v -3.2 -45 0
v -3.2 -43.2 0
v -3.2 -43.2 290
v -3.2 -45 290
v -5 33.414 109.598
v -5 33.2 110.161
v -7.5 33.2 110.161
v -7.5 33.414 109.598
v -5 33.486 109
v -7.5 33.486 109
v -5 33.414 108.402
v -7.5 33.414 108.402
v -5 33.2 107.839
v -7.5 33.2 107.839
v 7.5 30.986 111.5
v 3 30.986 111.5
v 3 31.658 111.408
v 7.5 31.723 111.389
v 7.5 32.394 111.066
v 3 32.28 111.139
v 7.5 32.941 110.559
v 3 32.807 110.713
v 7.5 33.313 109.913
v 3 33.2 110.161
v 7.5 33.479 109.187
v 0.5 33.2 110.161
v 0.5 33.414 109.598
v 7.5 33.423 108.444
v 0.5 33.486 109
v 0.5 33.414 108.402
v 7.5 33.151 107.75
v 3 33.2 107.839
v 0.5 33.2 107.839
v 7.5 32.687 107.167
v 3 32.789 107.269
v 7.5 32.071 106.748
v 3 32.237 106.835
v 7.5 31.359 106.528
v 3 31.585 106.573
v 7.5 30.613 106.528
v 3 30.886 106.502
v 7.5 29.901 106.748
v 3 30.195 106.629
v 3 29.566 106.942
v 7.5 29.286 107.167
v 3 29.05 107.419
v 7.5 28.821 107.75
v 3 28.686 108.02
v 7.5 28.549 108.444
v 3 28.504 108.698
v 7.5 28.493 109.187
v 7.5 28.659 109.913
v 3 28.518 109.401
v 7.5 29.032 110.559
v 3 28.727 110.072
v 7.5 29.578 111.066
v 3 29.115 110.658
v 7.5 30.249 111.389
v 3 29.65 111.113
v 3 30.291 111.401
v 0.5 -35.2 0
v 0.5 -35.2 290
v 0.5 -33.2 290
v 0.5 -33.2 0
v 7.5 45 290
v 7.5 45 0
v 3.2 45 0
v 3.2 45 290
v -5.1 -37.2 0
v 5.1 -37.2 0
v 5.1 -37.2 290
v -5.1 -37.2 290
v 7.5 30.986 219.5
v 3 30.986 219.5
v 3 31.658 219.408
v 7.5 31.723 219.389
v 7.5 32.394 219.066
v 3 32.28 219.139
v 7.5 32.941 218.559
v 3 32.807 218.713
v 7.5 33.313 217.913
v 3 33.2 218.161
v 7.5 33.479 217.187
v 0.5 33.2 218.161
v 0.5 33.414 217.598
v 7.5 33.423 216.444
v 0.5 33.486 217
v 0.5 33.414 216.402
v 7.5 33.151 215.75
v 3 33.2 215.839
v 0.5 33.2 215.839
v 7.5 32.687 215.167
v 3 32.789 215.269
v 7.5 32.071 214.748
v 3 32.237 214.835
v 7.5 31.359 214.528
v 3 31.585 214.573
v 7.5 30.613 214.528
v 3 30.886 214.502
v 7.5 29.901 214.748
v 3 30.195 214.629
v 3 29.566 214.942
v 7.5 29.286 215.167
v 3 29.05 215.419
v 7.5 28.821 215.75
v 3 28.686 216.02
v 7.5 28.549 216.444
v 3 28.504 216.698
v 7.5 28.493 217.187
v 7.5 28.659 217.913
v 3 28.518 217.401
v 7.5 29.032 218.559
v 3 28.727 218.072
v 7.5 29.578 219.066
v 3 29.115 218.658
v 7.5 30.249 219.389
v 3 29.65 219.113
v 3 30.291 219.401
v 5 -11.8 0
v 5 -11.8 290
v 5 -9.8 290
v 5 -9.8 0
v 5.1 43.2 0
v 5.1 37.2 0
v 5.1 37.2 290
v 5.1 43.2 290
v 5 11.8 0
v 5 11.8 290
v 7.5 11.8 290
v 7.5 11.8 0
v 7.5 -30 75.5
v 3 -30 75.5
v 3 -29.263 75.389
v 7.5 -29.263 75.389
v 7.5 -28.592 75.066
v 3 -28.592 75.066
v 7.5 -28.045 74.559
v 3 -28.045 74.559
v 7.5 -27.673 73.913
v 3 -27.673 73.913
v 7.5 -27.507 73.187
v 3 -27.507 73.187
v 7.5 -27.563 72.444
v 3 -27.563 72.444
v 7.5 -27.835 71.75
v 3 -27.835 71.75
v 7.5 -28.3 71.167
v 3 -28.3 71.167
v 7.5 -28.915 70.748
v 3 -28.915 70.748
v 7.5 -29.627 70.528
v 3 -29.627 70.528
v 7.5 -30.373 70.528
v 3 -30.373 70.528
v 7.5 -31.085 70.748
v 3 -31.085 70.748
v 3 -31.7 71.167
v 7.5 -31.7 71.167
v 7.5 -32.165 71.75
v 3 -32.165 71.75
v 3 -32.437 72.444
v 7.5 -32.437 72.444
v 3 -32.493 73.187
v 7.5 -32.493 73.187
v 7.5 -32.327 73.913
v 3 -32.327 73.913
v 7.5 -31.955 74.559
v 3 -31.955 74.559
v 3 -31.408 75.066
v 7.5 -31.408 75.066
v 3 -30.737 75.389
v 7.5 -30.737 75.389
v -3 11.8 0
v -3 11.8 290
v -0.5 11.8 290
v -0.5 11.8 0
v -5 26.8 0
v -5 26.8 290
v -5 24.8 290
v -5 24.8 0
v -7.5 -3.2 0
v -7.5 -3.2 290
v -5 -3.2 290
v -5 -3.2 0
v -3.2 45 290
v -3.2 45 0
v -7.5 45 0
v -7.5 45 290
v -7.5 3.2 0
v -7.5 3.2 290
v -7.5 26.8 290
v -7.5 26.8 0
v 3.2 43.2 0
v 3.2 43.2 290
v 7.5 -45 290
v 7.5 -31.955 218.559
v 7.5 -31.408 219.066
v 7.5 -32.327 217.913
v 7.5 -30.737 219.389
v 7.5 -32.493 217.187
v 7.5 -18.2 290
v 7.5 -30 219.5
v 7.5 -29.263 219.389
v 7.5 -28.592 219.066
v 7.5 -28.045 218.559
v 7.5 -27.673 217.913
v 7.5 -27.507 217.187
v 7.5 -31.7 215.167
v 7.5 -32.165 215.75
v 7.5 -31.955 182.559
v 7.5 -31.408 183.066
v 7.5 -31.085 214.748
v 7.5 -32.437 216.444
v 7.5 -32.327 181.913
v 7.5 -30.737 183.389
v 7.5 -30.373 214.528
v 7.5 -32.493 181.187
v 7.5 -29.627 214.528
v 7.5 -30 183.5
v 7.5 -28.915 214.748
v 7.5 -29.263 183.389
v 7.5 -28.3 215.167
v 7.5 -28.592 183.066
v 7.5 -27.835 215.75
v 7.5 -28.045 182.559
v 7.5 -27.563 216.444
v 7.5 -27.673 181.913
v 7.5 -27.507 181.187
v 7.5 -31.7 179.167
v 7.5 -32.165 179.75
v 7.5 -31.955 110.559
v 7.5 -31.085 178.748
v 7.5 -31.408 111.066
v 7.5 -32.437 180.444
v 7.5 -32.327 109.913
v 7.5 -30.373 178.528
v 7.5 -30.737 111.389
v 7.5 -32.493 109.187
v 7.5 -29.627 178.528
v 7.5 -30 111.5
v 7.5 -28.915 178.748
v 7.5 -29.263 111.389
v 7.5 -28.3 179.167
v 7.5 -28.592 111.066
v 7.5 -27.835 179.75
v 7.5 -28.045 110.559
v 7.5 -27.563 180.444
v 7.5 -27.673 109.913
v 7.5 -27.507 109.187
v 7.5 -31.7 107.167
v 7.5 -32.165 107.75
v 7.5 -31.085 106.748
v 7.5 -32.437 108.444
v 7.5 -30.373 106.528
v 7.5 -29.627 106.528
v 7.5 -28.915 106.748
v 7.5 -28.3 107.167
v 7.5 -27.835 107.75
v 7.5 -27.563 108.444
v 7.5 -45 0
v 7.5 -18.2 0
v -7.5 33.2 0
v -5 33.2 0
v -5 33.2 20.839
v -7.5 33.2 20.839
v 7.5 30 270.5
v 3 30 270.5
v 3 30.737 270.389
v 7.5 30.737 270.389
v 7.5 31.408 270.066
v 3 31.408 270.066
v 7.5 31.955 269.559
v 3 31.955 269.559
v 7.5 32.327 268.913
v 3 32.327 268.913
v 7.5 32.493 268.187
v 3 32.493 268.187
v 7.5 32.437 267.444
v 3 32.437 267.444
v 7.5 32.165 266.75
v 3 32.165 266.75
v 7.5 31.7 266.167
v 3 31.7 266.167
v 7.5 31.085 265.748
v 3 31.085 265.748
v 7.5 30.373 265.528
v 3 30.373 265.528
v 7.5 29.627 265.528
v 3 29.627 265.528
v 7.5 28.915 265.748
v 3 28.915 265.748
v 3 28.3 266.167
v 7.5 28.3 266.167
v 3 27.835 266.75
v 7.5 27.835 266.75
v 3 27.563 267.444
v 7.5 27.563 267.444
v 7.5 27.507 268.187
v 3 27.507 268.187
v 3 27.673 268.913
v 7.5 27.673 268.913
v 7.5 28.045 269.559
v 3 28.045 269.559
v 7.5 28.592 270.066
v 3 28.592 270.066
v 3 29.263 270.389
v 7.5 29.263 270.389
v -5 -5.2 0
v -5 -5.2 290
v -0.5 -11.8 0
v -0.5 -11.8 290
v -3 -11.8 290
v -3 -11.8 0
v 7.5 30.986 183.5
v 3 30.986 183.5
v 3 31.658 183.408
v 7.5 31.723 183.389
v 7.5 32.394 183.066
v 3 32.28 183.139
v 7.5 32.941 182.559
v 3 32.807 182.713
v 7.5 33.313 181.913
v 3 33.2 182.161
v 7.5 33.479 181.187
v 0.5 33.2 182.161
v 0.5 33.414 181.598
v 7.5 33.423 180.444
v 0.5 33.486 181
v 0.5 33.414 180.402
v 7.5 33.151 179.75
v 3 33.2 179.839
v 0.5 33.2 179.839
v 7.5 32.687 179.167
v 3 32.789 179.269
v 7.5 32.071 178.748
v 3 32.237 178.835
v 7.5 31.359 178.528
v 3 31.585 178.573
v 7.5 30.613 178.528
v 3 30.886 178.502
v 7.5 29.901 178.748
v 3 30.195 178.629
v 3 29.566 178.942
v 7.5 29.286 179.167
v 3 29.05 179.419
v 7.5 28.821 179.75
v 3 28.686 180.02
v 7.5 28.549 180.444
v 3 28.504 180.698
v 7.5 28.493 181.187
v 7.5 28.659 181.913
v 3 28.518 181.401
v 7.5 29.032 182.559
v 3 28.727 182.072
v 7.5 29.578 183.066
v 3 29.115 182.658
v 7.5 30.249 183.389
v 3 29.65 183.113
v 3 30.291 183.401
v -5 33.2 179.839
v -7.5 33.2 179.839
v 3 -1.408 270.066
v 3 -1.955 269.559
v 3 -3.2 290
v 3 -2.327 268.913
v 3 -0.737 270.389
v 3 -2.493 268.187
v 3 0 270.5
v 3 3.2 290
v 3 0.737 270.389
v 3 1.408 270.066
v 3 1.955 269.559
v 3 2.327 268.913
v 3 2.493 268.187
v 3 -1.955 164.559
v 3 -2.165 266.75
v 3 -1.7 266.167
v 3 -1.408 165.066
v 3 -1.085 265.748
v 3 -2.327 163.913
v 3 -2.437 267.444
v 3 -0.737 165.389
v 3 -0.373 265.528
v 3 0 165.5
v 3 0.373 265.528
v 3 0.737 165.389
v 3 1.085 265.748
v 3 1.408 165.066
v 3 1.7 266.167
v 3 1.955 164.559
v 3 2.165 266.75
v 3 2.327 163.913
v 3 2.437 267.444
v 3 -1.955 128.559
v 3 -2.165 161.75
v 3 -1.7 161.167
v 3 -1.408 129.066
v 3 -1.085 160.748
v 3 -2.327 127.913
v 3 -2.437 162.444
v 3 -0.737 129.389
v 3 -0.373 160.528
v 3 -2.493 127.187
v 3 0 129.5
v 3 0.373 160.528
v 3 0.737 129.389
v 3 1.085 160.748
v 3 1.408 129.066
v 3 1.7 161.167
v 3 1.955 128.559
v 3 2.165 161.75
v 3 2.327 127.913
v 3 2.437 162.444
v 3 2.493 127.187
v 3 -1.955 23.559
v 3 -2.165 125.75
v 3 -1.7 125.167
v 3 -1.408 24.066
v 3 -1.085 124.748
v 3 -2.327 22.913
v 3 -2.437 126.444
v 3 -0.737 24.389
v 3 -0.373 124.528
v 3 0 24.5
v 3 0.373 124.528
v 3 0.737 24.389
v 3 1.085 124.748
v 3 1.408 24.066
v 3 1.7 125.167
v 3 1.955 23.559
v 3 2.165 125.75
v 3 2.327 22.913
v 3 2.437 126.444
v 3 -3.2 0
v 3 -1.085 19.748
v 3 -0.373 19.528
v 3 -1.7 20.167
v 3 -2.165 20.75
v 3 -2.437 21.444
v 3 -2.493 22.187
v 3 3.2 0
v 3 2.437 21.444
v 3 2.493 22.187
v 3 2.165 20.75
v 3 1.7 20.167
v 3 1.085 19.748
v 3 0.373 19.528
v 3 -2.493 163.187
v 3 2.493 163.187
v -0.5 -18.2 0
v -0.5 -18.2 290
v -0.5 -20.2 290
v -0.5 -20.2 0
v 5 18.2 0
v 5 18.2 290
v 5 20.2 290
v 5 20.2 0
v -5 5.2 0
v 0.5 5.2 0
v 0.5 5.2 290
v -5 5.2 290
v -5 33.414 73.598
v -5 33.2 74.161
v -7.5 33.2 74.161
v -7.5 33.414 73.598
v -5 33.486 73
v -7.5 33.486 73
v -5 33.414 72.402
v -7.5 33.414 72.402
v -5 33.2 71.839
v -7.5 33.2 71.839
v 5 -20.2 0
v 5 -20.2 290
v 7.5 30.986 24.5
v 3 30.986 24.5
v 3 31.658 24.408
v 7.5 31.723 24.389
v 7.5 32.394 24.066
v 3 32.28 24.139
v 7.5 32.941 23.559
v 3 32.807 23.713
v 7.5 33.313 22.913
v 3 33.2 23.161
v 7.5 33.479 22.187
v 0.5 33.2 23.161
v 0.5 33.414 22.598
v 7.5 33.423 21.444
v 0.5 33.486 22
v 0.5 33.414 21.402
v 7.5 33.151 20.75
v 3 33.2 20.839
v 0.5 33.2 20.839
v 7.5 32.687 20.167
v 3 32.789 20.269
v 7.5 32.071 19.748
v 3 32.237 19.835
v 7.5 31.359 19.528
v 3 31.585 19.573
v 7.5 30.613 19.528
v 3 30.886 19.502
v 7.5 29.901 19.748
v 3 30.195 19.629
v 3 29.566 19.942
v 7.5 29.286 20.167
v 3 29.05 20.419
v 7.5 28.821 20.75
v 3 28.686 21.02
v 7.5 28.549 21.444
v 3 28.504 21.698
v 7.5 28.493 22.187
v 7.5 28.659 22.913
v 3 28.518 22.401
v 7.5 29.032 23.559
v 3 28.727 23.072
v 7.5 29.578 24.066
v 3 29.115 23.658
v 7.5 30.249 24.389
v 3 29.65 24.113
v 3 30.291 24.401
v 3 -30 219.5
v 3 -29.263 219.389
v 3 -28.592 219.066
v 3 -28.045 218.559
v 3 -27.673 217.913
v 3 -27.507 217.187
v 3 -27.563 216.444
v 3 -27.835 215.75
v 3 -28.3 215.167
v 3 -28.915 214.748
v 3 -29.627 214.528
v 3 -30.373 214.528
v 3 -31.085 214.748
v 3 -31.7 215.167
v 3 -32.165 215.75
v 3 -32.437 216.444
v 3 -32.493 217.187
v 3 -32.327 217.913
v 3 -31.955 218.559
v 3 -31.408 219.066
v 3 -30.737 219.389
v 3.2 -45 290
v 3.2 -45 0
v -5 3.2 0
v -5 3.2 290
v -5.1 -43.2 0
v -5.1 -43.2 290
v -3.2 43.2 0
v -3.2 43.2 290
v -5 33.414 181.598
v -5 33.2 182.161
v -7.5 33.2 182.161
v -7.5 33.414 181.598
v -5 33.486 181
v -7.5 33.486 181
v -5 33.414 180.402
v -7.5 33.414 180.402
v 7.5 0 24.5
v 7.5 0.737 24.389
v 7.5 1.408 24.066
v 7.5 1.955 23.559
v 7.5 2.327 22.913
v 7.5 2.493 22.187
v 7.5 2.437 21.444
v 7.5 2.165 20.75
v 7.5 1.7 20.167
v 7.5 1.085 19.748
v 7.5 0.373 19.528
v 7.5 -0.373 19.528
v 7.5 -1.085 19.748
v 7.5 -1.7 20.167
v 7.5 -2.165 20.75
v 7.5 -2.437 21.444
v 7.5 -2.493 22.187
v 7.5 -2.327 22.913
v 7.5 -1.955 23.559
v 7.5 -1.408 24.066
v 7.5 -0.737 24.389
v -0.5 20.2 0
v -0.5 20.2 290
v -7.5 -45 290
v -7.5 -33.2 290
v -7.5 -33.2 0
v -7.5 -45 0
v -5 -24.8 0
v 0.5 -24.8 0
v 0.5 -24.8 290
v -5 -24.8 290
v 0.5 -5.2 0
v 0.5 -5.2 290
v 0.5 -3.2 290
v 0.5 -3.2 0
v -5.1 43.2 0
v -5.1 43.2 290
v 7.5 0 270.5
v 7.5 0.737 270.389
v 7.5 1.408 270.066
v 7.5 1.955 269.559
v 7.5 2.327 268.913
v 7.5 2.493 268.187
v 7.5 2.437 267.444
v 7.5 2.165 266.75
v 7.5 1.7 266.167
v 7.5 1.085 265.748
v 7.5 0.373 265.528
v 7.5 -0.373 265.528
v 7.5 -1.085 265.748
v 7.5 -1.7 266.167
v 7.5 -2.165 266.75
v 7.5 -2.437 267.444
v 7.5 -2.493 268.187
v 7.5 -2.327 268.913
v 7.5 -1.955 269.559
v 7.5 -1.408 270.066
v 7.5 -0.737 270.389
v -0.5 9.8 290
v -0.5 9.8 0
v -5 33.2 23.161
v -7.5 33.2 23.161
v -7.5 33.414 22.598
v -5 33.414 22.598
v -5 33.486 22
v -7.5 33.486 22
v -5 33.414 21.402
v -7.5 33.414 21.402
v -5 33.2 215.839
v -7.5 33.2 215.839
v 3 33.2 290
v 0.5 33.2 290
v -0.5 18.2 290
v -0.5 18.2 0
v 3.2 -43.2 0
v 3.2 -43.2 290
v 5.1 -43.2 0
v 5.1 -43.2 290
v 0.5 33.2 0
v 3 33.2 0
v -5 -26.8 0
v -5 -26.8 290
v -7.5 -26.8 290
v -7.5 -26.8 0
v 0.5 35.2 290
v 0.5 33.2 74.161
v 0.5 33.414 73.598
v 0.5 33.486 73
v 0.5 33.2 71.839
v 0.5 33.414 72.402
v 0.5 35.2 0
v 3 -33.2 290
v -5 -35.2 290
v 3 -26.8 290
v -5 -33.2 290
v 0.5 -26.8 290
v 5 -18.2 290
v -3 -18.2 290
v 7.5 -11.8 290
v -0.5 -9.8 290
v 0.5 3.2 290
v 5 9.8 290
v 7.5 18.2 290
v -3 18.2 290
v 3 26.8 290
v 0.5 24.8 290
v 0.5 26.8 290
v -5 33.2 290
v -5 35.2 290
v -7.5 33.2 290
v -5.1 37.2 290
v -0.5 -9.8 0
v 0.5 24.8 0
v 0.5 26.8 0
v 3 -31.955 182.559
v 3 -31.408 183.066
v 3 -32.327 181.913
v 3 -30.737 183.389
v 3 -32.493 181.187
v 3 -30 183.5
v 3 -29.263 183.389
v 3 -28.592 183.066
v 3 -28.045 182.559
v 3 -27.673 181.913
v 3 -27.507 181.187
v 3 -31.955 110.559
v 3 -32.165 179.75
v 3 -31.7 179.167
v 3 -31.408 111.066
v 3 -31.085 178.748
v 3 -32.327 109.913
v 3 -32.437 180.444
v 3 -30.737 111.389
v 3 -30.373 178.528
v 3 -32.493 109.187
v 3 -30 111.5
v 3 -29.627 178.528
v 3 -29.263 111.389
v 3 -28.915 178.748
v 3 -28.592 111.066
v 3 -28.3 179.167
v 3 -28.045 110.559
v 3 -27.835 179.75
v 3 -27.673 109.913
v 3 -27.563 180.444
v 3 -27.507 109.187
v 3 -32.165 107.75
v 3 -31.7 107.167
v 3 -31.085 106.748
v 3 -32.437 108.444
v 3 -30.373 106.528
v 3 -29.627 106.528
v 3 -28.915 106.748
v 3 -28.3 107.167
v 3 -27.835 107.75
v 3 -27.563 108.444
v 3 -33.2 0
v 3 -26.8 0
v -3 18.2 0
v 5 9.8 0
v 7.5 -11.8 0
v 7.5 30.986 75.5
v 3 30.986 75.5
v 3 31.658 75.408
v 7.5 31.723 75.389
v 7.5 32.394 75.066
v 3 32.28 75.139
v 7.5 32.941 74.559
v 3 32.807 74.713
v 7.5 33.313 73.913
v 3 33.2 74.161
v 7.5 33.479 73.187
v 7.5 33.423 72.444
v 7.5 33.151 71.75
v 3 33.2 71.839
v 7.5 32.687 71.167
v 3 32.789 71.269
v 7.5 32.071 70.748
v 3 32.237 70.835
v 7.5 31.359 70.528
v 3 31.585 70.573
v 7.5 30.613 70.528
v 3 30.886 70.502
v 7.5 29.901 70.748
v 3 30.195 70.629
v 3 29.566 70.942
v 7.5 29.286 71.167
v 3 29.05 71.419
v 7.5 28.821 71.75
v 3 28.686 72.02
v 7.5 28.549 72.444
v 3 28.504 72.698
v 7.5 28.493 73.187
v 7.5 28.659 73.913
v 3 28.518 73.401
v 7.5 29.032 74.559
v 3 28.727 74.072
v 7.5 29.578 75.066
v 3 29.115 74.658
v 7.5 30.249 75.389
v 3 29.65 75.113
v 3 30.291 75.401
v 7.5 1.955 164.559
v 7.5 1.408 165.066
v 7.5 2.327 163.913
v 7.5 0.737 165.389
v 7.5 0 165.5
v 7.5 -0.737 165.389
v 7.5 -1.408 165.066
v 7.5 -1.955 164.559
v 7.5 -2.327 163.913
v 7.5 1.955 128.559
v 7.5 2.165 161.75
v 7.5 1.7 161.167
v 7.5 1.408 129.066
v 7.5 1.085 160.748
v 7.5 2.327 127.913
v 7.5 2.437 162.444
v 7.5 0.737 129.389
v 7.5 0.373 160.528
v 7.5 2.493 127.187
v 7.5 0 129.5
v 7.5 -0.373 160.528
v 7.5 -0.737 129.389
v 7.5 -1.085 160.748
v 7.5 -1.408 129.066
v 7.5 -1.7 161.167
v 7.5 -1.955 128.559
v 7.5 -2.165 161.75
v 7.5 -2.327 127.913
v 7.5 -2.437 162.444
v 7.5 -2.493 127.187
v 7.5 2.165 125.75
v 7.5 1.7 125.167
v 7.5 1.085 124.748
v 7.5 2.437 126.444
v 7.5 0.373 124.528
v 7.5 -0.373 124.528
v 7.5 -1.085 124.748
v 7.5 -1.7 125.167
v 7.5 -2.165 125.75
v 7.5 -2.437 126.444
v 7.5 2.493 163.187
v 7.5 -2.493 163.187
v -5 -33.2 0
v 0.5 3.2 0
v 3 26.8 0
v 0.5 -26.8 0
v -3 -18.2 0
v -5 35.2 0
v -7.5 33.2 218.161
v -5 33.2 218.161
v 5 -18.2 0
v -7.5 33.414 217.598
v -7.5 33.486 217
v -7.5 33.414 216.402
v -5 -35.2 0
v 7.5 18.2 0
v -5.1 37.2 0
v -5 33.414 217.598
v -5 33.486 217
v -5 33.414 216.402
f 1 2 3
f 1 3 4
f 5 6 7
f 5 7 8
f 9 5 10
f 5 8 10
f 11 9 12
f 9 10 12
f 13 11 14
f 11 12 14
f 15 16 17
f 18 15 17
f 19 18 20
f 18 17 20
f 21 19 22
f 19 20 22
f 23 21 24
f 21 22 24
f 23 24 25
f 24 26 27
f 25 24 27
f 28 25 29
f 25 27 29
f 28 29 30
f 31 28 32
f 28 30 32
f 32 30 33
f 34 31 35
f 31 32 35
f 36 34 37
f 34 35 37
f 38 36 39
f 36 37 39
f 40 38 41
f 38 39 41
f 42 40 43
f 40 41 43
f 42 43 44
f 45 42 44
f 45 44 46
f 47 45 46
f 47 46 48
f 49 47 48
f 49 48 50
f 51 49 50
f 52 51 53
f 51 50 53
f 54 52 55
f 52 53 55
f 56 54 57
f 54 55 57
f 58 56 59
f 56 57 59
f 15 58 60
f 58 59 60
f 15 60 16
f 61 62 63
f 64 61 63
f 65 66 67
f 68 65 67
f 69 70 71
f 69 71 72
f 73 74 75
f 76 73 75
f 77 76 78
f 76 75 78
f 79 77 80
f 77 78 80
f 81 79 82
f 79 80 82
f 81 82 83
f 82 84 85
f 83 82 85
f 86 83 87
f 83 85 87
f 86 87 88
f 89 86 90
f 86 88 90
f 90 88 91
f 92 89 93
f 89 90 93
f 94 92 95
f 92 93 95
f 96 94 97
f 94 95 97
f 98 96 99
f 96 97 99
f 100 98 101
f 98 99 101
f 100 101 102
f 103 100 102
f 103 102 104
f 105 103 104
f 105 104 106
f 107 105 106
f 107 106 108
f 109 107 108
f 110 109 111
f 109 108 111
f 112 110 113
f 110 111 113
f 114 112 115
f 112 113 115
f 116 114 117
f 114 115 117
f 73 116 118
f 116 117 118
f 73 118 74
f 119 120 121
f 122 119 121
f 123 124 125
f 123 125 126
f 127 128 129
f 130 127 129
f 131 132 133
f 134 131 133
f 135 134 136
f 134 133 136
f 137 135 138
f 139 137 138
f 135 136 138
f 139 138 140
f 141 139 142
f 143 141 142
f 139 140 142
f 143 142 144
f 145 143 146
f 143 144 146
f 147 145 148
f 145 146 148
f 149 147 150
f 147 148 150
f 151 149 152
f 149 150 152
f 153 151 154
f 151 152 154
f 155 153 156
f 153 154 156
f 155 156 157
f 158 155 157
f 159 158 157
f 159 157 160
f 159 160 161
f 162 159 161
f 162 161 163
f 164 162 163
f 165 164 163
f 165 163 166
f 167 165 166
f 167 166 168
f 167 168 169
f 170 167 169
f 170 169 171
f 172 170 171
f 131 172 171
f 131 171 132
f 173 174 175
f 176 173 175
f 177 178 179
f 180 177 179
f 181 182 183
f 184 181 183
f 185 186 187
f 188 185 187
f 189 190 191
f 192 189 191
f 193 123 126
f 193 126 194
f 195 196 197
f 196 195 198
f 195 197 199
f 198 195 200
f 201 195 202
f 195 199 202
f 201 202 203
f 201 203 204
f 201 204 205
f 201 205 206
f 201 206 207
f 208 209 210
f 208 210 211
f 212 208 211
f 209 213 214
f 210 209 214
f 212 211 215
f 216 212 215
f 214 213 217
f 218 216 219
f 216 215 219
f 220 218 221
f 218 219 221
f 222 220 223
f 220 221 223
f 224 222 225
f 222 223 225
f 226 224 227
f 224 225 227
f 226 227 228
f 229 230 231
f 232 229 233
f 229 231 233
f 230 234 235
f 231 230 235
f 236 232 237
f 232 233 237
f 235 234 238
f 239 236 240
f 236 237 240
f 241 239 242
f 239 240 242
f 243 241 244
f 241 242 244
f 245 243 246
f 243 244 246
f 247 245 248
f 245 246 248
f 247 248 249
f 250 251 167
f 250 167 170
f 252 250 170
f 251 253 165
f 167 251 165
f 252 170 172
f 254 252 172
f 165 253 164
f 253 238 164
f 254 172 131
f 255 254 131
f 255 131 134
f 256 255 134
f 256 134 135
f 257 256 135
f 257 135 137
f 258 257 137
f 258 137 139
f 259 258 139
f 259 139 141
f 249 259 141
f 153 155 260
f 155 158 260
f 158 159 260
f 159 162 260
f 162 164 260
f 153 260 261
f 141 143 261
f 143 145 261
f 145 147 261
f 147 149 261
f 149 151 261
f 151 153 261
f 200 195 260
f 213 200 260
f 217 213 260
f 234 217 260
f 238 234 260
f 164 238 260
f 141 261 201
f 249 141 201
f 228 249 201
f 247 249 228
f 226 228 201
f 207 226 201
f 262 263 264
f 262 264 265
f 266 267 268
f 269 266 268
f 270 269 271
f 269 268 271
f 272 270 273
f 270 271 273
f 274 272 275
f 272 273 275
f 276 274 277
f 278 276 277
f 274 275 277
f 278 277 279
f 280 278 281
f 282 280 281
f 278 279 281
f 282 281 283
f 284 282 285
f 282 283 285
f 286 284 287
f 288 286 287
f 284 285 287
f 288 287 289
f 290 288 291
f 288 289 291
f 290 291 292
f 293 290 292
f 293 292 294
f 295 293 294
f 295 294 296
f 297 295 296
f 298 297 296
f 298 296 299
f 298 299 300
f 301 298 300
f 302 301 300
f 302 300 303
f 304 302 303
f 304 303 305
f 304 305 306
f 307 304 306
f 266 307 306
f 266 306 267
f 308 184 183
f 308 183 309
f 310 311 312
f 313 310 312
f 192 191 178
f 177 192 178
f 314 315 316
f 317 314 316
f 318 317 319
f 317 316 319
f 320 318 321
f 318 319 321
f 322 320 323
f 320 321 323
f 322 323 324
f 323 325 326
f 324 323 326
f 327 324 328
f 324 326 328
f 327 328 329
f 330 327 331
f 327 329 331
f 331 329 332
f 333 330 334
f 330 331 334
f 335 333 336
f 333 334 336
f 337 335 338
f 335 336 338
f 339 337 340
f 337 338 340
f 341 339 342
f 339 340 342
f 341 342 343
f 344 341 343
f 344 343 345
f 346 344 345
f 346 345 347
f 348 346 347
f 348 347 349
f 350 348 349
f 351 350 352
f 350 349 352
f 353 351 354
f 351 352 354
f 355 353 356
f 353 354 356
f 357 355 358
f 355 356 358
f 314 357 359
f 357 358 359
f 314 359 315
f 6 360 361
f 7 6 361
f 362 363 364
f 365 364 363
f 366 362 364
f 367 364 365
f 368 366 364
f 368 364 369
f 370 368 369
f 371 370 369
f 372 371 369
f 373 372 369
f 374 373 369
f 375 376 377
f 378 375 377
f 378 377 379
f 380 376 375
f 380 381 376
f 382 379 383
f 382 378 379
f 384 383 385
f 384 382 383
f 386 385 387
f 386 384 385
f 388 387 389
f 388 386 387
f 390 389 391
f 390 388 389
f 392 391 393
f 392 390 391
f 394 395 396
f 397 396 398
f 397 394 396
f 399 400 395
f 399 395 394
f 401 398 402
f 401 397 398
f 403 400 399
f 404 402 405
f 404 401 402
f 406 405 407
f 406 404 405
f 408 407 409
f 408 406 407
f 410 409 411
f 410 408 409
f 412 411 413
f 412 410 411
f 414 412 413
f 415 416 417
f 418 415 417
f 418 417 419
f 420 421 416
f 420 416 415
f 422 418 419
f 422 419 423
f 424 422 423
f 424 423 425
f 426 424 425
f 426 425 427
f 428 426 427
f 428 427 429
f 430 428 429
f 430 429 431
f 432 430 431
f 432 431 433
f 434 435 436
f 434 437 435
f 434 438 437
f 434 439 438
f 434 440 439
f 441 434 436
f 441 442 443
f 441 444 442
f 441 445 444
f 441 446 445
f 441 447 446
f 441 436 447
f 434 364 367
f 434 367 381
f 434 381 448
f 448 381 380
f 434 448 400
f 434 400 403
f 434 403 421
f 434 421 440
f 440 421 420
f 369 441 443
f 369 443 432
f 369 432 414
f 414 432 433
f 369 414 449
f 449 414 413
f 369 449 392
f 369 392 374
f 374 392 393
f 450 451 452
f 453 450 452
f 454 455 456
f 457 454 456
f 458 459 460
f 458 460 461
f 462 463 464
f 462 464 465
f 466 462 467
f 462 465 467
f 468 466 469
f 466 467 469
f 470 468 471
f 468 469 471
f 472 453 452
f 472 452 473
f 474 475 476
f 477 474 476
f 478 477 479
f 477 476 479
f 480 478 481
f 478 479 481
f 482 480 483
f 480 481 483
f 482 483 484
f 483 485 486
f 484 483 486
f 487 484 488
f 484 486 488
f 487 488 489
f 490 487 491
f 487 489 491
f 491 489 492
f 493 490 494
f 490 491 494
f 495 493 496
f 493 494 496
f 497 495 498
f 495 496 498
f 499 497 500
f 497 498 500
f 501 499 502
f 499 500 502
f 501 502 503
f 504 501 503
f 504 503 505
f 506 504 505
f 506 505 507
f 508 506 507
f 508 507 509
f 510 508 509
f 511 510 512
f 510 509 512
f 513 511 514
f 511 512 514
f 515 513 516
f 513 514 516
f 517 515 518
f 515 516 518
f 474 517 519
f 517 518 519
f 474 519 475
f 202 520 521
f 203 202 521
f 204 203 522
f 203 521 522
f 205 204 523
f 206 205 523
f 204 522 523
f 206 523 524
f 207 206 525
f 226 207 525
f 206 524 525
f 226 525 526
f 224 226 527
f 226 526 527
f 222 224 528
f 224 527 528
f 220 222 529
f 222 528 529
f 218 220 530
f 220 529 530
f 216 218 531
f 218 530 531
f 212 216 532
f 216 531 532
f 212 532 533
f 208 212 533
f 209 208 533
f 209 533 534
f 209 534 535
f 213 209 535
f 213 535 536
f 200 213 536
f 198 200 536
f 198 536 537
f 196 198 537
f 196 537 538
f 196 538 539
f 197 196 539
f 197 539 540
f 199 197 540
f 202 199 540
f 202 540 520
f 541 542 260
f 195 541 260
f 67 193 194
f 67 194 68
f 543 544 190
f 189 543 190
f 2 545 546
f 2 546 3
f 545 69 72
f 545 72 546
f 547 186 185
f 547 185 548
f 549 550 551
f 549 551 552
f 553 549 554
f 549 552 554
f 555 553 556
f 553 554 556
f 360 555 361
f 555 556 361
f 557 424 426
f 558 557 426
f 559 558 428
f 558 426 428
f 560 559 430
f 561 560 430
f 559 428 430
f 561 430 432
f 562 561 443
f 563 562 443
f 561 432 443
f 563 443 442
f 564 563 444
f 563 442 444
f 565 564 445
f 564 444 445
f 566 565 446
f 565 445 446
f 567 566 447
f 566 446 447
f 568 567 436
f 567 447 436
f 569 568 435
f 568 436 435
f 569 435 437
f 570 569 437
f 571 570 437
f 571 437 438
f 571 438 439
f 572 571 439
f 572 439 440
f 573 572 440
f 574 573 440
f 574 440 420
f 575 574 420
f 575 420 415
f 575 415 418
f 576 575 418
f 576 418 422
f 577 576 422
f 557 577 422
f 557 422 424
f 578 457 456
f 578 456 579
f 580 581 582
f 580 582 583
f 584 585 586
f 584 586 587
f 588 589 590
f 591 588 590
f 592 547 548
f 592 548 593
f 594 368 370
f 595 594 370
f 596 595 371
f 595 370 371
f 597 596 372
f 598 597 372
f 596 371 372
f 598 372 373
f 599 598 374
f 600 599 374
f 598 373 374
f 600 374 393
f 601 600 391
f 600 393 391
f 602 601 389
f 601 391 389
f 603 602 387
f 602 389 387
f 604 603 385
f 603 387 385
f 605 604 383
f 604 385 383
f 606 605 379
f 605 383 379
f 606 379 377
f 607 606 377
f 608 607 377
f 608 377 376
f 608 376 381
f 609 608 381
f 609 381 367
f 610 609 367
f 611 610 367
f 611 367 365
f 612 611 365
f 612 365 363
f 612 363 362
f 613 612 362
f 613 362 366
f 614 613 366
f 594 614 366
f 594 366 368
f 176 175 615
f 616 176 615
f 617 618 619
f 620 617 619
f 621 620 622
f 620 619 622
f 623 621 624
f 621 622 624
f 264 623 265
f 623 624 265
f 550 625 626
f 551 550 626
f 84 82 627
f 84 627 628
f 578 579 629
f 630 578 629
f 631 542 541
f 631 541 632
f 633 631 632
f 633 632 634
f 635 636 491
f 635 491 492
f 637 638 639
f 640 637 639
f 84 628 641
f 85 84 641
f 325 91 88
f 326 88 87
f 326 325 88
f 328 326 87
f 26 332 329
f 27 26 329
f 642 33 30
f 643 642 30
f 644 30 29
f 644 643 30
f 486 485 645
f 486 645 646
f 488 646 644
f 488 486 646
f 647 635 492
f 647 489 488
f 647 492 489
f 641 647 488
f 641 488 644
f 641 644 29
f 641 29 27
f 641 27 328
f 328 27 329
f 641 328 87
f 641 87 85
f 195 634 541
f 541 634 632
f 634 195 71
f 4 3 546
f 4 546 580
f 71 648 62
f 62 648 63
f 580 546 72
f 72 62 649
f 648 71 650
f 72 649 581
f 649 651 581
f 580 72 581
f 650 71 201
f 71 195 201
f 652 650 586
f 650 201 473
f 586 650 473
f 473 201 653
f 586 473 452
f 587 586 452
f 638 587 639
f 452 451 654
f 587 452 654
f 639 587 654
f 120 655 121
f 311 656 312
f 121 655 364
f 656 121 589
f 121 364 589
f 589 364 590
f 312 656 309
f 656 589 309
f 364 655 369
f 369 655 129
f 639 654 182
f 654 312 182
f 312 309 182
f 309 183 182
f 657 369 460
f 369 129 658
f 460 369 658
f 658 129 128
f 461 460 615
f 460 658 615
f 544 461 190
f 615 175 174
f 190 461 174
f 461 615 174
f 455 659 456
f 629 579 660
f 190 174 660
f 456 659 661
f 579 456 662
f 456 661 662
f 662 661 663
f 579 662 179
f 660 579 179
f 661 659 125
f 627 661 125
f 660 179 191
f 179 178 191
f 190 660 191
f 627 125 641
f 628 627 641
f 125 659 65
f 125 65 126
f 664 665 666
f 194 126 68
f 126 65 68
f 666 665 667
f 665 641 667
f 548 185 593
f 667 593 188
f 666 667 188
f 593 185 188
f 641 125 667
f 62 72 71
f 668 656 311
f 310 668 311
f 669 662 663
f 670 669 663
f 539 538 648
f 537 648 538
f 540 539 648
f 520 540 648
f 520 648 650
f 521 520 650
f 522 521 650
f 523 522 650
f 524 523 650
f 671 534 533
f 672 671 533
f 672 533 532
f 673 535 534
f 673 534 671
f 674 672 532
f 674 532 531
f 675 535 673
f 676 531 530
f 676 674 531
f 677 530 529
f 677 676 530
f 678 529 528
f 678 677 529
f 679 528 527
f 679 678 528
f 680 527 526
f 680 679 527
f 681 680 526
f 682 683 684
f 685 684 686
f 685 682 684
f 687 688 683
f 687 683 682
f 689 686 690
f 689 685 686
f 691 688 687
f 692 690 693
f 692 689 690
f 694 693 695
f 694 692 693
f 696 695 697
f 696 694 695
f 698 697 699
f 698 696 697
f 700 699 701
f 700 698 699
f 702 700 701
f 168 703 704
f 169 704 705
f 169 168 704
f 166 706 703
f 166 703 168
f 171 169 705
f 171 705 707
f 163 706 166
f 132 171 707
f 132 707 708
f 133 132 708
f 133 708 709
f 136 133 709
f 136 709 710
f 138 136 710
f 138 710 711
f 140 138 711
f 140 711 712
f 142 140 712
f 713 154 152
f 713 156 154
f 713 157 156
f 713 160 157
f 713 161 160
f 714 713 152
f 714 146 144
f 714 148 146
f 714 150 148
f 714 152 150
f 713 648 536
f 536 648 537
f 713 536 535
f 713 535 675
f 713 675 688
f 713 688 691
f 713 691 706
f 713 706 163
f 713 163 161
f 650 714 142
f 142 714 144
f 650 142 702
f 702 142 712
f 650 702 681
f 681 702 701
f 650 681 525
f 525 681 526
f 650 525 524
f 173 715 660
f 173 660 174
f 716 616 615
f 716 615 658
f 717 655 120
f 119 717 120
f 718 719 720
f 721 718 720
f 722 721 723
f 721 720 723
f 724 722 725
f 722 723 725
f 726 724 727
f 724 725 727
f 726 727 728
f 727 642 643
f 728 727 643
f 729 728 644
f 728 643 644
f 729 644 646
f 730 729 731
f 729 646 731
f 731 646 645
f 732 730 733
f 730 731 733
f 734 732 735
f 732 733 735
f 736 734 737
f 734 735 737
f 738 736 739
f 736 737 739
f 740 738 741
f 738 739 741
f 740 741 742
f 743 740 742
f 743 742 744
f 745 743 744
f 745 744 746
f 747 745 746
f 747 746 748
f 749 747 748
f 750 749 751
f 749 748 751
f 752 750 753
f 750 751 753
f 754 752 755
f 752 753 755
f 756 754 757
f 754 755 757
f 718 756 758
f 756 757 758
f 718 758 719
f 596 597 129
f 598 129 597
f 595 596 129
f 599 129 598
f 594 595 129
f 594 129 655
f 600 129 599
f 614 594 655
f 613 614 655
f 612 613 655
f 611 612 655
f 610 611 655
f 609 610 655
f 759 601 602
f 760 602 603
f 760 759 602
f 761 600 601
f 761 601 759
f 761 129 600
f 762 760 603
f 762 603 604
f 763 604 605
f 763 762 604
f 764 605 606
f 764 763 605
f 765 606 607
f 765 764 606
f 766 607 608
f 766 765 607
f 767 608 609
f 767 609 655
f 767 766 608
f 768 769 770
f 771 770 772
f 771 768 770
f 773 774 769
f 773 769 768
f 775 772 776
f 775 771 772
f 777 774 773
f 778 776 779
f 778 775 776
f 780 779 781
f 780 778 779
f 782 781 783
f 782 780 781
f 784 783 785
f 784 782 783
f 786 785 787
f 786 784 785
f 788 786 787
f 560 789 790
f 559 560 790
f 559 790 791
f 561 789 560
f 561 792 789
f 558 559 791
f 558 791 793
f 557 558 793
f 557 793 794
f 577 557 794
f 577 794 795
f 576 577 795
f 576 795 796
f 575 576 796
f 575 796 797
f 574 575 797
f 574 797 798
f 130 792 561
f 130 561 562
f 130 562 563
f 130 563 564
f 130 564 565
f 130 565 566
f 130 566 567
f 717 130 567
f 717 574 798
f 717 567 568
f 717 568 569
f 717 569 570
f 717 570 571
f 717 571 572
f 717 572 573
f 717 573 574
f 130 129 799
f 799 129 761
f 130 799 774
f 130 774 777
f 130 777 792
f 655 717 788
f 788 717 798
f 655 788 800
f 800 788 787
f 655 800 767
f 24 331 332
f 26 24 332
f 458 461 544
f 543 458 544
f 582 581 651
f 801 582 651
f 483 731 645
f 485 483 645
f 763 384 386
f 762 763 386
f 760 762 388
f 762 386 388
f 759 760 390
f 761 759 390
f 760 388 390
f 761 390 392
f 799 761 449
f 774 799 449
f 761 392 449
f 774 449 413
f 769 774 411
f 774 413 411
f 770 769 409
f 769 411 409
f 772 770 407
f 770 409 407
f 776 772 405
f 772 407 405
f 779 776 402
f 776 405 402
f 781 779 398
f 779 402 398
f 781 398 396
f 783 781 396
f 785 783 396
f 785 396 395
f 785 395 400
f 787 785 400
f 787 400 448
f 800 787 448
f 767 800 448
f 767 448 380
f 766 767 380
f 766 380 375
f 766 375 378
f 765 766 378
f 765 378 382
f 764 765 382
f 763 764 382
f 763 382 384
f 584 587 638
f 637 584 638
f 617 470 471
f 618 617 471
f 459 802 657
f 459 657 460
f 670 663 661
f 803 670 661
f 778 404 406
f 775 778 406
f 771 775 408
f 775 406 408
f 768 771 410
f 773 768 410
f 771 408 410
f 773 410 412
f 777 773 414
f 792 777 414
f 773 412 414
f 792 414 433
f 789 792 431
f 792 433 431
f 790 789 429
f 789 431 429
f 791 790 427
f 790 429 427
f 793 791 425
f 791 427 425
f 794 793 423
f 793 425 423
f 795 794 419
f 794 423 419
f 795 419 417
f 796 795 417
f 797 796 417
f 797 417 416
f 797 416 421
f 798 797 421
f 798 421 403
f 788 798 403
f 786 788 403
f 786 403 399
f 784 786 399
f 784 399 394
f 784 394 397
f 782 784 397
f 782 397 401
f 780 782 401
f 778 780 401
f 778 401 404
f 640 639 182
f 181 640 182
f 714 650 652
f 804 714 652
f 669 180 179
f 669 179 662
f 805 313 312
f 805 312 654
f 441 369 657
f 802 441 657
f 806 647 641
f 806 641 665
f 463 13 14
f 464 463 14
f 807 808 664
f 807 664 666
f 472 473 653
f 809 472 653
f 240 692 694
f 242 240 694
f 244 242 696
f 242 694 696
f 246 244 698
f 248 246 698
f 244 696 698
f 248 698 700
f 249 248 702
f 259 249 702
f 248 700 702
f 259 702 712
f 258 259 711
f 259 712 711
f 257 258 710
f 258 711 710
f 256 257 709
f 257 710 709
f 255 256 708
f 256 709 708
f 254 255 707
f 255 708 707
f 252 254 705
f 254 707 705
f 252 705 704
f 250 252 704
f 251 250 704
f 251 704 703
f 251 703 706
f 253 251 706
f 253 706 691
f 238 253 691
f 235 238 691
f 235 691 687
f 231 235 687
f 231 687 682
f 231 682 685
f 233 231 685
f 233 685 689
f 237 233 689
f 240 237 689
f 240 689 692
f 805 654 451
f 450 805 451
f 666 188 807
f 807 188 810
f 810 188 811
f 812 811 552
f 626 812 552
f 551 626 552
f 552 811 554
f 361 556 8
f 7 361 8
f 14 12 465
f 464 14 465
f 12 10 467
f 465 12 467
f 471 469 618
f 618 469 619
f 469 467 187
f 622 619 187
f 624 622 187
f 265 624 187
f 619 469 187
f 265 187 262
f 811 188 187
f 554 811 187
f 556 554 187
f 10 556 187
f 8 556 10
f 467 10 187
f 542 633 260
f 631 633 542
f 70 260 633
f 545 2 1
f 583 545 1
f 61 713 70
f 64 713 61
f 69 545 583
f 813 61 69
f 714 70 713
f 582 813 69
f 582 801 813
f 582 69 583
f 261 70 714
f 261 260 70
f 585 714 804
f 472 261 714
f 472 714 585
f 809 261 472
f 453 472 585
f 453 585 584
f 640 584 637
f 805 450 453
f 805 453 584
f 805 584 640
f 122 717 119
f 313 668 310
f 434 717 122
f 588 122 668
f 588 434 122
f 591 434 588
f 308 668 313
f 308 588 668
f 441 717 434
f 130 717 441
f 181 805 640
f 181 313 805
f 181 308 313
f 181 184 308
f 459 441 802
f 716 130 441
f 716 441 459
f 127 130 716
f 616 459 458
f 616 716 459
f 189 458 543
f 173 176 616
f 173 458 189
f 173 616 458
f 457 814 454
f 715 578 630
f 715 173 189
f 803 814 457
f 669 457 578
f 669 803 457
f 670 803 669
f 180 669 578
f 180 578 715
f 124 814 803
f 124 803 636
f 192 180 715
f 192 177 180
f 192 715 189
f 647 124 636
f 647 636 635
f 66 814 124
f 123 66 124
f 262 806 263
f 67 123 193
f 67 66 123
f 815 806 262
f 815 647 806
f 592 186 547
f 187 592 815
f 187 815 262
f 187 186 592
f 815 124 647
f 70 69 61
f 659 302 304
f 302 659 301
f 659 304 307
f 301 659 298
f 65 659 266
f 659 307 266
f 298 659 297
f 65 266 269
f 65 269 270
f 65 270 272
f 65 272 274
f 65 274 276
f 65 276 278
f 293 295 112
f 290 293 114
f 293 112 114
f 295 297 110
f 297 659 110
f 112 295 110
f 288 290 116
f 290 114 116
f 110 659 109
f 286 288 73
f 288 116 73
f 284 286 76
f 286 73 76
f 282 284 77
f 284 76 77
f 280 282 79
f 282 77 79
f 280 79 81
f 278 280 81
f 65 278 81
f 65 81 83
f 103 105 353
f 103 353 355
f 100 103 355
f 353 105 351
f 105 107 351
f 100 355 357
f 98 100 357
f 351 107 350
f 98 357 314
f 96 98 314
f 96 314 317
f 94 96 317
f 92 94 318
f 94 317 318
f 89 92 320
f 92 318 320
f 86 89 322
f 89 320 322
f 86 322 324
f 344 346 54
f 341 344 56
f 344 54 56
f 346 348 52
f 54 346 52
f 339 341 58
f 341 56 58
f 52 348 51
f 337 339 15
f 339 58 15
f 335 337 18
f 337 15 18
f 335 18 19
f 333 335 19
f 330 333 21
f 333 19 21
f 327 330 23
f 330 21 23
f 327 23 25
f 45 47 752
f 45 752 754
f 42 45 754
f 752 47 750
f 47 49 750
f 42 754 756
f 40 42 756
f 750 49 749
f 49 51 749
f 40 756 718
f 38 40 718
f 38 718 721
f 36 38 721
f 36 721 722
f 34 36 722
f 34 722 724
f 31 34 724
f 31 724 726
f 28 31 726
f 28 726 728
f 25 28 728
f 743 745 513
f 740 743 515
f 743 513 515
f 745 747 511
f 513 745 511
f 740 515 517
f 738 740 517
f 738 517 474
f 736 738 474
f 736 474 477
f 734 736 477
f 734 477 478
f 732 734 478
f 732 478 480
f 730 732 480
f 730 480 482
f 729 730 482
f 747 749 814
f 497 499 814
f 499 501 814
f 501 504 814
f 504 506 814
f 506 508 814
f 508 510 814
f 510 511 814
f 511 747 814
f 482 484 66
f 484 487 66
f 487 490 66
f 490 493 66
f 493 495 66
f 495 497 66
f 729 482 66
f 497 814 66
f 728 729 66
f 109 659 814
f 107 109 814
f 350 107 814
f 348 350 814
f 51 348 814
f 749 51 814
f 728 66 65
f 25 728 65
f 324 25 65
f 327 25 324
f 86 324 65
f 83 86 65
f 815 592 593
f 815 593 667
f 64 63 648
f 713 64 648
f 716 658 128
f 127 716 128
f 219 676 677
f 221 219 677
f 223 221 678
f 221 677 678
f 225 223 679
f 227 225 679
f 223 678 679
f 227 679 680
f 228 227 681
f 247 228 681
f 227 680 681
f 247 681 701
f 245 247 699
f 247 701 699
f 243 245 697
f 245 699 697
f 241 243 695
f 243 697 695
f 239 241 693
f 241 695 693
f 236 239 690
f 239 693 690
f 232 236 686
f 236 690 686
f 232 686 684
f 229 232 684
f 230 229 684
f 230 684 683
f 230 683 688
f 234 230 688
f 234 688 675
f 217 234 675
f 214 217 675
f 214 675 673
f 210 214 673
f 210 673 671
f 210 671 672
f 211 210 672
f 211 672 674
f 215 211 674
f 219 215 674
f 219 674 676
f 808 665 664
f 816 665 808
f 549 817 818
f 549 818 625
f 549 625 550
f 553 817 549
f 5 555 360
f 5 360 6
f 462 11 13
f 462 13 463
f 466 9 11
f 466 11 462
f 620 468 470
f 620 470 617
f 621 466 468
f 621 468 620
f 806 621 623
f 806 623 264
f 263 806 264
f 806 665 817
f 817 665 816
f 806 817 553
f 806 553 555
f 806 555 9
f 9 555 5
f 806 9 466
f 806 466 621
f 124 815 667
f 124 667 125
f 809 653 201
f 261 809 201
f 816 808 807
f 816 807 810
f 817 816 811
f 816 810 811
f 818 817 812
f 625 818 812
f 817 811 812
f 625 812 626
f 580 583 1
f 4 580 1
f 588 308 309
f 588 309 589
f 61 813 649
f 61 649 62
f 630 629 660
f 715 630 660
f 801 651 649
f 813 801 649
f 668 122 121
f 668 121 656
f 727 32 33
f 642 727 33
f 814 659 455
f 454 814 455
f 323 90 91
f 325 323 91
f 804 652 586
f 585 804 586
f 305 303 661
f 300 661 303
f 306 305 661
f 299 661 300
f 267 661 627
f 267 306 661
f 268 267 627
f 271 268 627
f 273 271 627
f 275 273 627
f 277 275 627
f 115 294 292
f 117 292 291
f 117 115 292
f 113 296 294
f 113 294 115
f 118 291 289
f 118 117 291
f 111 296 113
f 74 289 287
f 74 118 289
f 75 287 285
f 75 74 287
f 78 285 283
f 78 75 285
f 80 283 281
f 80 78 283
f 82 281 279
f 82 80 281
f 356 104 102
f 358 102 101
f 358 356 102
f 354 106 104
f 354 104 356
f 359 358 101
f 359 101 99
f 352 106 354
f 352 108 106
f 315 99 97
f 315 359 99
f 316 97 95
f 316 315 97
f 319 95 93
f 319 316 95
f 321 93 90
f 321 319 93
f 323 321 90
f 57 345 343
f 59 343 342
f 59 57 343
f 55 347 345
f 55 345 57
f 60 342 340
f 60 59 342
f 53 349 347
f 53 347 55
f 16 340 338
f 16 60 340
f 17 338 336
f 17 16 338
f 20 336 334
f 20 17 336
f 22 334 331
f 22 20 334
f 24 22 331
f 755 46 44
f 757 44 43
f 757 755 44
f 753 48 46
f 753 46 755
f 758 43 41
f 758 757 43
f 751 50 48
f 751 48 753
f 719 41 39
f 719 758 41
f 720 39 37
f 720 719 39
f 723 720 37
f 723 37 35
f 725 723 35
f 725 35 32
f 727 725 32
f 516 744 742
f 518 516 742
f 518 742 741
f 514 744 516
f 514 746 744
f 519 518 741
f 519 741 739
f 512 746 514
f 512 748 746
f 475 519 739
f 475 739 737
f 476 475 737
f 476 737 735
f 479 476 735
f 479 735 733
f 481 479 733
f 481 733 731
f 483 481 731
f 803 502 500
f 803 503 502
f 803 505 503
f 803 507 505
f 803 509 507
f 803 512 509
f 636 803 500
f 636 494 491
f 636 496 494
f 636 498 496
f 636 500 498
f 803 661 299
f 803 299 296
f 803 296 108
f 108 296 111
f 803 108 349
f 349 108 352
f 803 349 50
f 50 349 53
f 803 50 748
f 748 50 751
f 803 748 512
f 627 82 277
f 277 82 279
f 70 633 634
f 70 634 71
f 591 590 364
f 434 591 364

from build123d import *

# Parameters (mm, degrees)
EXTRUDE_1_DEPTH           = 290
HOLE_WIZARD_5_0_5_1_D     = 5
HOLE_WIZARD_5_0_5_2_D     = 5
HOLE_WIZARD_5_0_5_2_DEPTH = 20
HOLE_WIZARD_5_0_5_2_TIP   = 1.502151548


with BuildPart() as part:
    # Sketch1 → 凸台-拉伸1 (new body)
    with BuildSketch(Plane.XY):
        Polygon((-6.5, 45), (-3.2, 45), (-3.2, 43.2), (-5.1, 43.2), (-5.1, 37.2), (5.1, 37.2), (5.1, 43.2), (3.2, 43.2), (3.2, 45), (6.5, 45), (7.5, 45), (7.5, 44), (7.5, 18.2), (5, 18.2), (5, 20.2), (-0.5, 20.2), (-0.5, 18.2), (-3, 18.2), (-3, 11.8), (-0.5, 11.8), (-0.5, 9.8), (5, 9.8), (5, 11.8), (7.5, 11.8), (7.5, -11.8), (5, -11.8), (5, -9.8), (-0.5, -9.8), (-0.5, -11.8), (-3, -11.8), (-3, -18.2), (-0.5, -18.2), (-0.5, -20.2), (5, -20.2), (5, -18.2), (7.5, -18.2), (7.5, -44), (7.5, -45), (6.5, -45), (3.2, -45), (3.2, -43.2), (5.1, -43.2), (5.1, -37.2), (-5.1, -37.2), (-5.1, -43.2), (-3.2, -43.2), (-3.2, -45), (-6.496721962, -45), (-7.5, -45), (-7.5, -44), (-7.5, -33.2), (-5, -33.2), (-5, -35.2), (0.5, -35.2), (0.5, -33.2), (3, -33.2), (3, -26.8), (0.5, -26.8), (0.5, -24.8), (-5, -24.8), (-5, -26.8), (-7.5, -26.8), (-7.5, -3.2), (-5, -3.2), (-5, -5.2), (0.5, -5.2), (0.5, -3.2), (3, -3.2), (3, 3.2), (0.5, 3.2), (0.5, 5.2), (-5, 5.2), (-5, 3.2), (-7.5, 3.2), (-7.5, 26.8), (-5, 26.8), (-5, 24.8), (0.5, 24.8), (0.5, 26.8), (3, 26.8), (3, 33.2), (0.5, 33.2), (0.5, 35.2), (-5, 35.2), (-5, 33.2), (-7.5, 33.2), (-7.5, 44), (-7.5, 45), align=None)
    extrude(amount=EXTRUDE_1_DEPTH)

    # Ø5.0 (5) 直径孔1 (through all)
    with Locations(Plane(origin=(7.5, 0, 0), x_dir=(0, 0, -1), z_dir=(1, 0, 0))):
        with Locations((-268, 30)):
            Hole(HOLE_WIZARD_5_0_5_1_D / 2)

    # Ø5.0 (5) 直径孔2
    with Locations(Plane(origin=(7.5, 0, 0), x_dir=(0, 0, -1), z_dir=(1, 0, 0))):
        with Locations((-217, 30.986103622), (-181, 30.986103622), (-109, 30.986103622), (-73, 30.986103622), (-22, 30.986103622), (-268, 0), (-217, -30), (-181, -30), (-163, 0), (-127, 0), (-109, -30), (-73, -30), (-22, 0)):
            Hole(HOLE_WIZARD_5_0_5_2_D / 2, depth=HOLE_WIZARD_5_0_5_2_DEPTH)
            with Locations((0, 0, -(HOLE_WIZARD_5_0_5_2_DEPTH + HOLE_WIZARD_5_0_5_2_TIP / 2))):  # 118° drill point
                Cone(0, HOLE_WIZARD_5_0_5_2_D / 2, HOLE_WIZARD_5_0_5_2_TIP, mode=Mode.SUBTRACT)


solid = part.part
